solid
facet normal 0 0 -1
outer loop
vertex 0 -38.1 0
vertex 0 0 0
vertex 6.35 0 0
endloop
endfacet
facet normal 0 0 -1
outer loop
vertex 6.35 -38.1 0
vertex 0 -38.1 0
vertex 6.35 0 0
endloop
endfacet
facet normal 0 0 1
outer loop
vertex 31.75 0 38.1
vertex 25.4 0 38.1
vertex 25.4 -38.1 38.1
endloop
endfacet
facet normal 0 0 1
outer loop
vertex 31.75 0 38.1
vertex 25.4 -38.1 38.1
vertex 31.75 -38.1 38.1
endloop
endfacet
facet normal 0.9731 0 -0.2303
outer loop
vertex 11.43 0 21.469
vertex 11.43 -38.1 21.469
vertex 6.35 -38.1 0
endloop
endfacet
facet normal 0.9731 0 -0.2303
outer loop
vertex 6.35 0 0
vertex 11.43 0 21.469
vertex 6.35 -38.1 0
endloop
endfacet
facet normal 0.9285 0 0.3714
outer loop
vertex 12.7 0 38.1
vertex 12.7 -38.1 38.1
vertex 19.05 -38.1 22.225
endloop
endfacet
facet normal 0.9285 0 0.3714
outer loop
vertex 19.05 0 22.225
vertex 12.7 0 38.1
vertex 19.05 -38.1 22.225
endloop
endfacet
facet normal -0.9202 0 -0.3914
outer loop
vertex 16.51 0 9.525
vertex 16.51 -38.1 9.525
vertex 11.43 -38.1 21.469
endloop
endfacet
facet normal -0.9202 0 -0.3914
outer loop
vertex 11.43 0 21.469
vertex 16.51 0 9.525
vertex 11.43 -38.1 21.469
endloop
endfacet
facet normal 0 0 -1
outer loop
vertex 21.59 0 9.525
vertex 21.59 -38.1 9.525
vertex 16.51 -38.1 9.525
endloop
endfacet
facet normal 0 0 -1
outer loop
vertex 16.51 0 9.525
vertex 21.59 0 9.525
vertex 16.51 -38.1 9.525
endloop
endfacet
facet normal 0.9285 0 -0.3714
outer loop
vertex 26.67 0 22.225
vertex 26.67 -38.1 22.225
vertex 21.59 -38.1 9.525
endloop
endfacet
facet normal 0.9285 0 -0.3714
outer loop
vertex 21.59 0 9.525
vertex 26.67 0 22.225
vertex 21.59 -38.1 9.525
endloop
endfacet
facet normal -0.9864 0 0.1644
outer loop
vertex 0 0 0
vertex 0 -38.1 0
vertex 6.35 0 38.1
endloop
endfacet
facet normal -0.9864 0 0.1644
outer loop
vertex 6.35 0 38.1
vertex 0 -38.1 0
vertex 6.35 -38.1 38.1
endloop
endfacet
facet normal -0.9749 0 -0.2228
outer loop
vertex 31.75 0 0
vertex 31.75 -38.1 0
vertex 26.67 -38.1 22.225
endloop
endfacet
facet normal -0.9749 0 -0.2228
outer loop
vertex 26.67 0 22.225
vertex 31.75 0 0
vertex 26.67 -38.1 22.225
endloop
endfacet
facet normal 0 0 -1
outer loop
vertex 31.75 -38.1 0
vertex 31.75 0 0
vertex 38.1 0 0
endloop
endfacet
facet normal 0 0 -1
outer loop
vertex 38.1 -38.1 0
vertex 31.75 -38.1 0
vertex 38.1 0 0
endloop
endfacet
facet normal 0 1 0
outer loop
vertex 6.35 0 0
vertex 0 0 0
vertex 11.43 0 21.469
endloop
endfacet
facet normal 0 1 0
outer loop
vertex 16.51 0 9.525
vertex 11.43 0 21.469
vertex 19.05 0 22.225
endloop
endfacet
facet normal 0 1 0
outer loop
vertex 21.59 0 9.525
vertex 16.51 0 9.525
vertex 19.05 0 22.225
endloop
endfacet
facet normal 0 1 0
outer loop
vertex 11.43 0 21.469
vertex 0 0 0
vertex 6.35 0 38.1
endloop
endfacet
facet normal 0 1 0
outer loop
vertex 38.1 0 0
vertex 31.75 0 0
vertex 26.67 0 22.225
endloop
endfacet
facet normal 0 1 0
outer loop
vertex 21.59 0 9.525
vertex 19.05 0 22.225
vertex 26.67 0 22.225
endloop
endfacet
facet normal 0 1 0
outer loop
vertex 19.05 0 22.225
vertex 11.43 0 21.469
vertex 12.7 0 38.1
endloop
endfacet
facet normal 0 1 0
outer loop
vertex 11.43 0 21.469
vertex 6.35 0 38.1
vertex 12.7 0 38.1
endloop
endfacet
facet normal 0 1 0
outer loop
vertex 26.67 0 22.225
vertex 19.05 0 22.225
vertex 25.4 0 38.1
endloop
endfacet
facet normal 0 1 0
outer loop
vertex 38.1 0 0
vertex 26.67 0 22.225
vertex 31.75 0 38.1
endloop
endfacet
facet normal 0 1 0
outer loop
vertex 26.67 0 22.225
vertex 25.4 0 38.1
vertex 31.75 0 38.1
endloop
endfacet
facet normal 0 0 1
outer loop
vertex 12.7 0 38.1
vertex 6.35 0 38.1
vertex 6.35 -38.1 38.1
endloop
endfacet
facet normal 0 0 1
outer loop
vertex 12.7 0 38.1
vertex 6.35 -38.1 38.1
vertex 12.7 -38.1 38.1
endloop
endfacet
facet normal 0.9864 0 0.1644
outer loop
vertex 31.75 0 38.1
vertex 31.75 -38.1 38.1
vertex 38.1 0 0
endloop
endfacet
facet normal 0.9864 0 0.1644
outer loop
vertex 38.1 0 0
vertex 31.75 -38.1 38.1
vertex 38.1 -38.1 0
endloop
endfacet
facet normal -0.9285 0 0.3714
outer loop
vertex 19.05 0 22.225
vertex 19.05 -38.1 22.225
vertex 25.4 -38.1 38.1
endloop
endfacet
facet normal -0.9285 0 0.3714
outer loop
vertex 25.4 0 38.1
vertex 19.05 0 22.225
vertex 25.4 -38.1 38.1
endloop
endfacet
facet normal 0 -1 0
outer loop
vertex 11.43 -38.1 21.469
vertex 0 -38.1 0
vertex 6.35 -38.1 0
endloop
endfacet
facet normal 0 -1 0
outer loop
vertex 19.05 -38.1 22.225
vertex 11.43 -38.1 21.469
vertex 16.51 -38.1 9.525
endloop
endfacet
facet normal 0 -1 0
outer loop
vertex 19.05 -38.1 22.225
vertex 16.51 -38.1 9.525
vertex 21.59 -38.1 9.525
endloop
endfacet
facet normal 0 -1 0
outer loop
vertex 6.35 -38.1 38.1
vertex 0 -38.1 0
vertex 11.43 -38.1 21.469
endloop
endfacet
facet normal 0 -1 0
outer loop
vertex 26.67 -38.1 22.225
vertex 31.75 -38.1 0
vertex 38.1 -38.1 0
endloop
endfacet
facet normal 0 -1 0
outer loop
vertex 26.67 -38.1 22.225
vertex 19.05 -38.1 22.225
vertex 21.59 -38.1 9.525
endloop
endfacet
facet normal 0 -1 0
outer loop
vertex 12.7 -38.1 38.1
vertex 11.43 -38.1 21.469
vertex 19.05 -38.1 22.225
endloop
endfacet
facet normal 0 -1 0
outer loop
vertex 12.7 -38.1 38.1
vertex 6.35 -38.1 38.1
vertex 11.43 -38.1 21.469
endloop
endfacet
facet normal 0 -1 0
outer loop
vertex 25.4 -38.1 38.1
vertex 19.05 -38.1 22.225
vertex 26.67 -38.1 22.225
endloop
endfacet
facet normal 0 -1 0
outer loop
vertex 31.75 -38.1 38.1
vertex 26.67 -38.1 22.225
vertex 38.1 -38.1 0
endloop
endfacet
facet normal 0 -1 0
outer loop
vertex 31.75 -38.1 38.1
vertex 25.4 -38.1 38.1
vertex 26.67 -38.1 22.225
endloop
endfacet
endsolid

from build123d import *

# Parameters (mm, degrees)
F0_W     = 38.1
F0_H     = 38.1
F1_DEPTH = 38.1
F5_DEPTH = 38.1


with BuildPart() as f1:
    # F0 (on Front) → F1 (new body)
    with BuildSketch(Plane.XZ):
        with Locations((19.05, 19.05)):
            Rectangle(F0_W, F0_H)
    extrude(amount=F1_DEPTH)

    # F4 (on offset) → F5 (cut)
    with BuildSketch(Plane.XZ.offset(38.1)):
        Polygon((11.43, 21.469494), (6.35, 0), (31.75, 0), (26.67, 22.225), (21.59, 9.525), (16.51, 9.525), align=None)
        Polygon((31.75, 38.1), (38.1, 0), (38.1, 38.1), align=None)
        Polygon((25.4, 38.1), (12.7, 38.1), (19.05, 22.225), align=None)
        Polygon((6.35, 38.1), (0, 38.1), (0, 0), align=None)
    extrude(amount=-F5_DEPTH, mode=Mode.SUBTRACT)


solid = f1.part
